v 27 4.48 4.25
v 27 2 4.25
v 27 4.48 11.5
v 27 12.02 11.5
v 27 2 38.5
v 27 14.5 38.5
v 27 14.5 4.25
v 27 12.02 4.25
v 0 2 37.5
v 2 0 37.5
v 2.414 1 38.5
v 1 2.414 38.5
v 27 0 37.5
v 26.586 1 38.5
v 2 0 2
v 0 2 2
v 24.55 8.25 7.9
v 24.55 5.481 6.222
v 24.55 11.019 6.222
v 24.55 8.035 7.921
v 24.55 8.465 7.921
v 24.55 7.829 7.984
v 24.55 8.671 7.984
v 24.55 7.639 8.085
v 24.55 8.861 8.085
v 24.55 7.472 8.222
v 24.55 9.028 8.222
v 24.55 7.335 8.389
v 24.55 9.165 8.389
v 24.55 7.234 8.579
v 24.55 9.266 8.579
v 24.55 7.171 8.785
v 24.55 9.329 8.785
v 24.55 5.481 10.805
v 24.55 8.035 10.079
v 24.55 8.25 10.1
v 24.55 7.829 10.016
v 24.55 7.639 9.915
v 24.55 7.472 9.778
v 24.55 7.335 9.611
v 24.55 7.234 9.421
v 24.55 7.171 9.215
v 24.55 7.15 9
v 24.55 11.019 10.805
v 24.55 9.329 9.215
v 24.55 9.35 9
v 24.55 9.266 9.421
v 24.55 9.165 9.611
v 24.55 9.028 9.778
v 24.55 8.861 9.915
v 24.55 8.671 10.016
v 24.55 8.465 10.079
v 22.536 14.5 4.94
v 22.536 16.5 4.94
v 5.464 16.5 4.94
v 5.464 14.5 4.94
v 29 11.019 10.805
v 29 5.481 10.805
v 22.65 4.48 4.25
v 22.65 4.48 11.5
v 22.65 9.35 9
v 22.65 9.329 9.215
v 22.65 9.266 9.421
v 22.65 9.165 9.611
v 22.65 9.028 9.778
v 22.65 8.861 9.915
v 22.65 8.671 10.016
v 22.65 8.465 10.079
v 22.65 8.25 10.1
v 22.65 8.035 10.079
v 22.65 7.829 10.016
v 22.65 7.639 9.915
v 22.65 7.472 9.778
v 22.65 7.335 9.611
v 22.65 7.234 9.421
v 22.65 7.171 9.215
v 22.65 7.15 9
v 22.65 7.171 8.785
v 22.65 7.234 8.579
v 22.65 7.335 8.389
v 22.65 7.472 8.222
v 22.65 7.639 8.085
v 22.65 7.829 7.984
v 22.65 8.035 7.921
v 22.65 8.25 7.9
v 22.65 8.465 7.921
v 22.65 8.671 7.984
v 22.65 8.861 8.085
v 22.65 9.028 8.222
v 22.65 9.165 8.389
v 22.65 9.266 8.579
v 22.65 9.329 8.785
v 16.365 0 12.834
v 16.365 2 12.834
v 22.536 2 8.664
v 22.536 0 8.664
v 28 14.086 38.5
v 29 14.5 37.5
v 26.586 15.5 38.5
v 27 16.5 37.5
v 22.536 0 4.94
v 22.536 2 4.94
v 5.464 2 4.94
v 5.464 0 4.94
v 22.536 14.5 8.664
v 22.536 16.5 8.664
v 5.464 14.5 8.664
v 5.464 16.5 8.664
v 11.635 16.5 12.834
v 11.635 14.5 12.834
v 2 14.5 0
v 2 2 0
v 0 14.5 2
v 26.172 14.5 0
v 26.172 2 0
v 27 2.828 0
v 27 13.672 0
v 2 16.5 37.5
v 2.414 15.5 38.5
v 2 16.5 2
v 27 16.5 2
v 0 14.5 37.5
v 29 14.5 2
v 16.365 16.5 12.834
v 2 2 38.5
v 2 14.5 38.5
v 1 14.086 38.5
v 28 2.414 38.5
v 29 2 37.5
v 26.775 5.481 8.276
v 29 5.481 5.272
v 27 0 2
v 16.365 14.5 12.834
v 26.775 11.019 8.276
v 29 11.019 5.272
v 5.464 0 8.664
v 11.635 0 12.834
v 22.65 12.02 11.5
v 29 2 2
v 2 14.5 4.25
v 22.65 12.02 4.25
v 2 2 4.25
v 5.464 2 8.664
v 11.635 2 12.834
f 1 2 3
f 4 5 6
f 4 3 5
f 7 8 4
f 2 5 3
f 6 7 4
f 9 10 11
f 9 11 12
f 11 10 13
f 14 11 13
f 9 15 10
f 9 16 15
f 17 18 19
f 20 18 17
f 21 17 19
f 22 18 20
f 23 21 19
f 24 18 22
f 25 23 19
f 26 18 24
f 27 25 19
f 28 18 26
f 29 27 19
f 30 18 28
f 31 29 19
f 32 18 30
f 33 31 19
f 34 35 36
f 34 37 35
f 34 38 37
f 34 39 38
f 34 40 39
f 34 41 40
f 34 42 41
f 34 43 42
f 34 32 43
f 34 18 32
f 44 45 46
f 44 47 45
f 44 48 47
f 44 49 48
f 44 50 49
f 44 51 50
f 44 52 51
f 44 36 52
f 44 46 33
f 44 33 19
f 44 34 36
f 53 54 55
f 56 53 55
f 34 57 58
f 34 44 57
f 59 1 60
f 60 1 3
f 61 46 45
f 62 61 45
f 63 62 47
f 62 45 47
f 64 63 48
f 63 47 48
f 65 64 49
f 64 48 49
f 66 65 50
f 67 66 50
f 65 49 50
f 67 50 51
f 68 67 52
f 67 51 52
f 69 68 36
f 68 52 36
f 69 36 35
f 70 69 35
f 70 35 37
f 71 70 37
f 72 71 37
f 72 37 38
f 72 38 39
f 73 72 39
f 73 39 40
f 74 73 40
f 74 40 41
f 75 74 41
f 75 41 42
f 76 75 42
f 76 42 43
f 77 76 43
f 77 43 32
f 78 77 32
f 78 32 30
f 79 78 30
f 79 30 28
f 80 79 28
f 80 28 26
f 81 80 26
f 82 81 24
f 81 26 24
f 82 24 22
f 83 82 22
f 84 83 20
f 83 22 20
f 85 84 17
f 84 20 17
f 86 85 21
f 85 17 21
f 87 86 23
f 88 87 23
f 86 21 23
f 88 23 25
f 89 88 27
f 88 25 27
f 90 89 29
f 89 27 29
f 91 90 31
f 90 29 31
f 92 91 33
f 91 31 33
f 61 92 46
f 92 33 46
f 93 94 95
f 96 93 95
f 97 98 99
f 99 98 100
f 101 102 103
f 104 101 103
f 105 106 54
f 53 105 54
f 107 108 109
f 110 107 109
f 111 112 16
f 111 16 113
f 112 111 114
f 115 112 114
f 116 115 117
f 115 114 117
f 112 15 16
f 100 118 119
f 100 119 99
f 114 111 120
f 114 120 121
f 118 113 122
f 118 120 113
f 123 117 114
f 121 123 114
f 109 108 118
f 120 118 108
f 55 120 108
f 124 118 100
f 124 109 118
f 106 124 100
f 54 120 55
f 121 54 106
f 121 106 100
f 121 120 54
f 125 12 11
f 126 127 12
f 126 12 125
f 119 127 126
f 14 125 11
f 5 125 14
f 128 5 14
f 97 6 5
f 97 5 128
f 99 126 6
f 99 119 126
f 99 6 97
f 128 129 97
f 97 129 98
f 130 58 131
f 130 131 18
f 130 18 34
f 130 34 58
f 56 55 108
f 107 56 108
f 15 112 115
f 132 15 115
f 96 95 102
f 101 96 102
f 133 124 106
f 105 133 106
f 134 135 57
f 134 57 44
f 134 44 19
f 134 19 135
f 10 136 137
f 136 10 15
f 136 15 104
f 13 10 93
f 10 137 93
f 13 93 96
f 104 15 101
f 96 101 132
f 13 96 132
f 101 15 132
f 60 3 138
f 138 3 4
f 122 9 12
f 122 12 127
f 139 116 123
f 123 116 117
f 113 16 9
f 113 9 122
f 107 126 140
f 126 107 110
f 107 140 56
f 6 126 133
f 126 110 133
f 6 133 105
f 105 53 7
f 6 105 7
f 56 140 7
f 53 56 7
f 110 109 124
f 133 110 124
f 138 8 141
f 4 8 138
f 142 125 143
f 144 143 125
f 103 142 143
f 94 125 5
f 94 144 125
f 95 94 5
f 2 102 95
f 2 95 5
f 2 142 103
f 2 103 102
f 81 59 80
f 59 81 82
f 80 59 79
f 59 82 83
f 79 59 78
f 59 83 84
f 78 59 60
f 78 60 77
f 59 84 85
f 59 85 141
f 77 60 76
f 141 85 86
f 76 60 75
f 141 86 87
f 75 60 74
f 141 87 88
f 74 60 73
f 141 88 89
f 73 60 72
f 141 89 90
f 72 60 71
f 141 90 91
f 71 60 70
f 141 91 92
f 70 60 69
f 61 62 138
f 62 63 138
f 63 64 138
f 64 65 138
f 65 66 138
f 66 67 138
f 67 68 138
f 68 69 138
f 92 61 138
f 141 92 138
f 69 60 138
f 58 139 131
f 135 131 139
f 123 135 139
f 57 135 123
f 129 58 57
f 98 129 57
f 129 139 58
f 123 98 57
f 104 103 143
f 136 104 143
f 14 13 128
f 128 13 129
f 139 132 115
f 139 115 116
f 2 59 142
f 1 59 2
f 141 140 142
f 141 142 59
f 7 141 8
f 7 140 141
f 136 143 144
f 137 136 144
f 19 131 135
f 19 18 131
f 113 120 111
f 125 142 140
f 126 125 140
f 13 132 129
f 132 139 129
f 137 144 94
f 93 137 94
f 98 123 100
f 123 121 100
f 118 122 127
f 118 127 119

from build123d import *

# Parameters (mm, degrees)
F0_W      = 29
F0_H      = 16.5
F1_DEPTH  = 38.5
F2_T      = -2
F3_DEPTH  = 2.25
F4_SIZE   = 2
F5_SIZE   = 2
F6_SIZE   = 1
F8_DEPTH  = 16.501
F9_W      = 7.54
F9_H      = 7.25
F9_R      = 1.1
F10_DEPTH = 6.35
F11_W     = 5.538
F11_H     = 5.533
F13_W     = 5.538
F13_H     = 4.583


with BuildPart() as f1:
    # F0 (on Top) → F1 (new body)
    with BuildSketch(Plane.XY):
        with Locations((14.5, 8.25)):
            Rectangle(F0_W, F0_H)
    extrude(amount=F1_DEPTH)

    # F2
    f2_openings = [f1.faces().sort_by_distance(p)[0] for p in [
        (14.5, 8.25, 38.5),
    ]]
    offset(amount=F2_T, openings=f2_openings)

    # F3 (add): a face of the model
    f3_faces = [f1.faces().sort_by_distance(p)[0] for p in [
        (14.5, 8.25, 2),
    ]]
    extrude(f3_faces, amount=F3_DEPTH)

    # F4
    f4_edges = [f1.edges().sort_by_distance(p)[0] for p in [
        (29, 0, 19.25),
        (29, 16.5, 19.25),
    ]]
    chamfer(f4_edges, length=F4_SIZE)

    # F5
    f5_edges = [f1.edges().sort_by_distance(p)[0] for p in [
        (0, 16.5, 19.25),
        (0, 0, 19.25),
        (13.5, 16.5, 0),
        (13.5, 0, 0),
        (28, 1, 0),
        (0, 8.25, 0),
        (29, 8.25, 0),
        (28, 15.5, 0),
    ]]
    chamfer(f5_edges, length=F5_SIZE)

    # F6
    f6_edges = [f1.edges().sort_by_distance(p)[0] for p in [
        (0, 8.25, 38.5),
        (1, 1, 38.5),
        (14.5, 0, 38.5),
        (1, 15.5, 38.5),
        (14.5, 16.5, 38.5),
        (28, 15.5, 38.5),
        (29, 8.25, 38.5),
        (28, 1, 38.5),
    ]]
    chamfer(f6_edges, length=F6_SIZE)

    # F7 (on face) → F8 (cut, through all)
    with BuildSketch(Plane(origin=(0, 16.5, 0), x_dir=(-1, 0, 0), z_dir=(0, 1, 0))):
        Polygon((-22.536, 8.664), (-22.536, 4.94), (-5.464, 4.94), (-5.464, 8.664), (-11.635, 12.834), (-16.365, 12.834), align=None)
    extrude(amount=-F8_DEPTH, mode=Mode.SUBTRACT)

    # F9 (on face) → F10 (join)
    with BuildSketch(Plane.YZ.offset(29)):
        with Locations((8.25, 7.875)):
            Rectangle(F9_W, F9_H)
        with Locations((8.25, 9)):
            Circle(F9_R, mode=Mode.SUBTRACT)
    extrude(amount=-F10_DEPTH)

    # F11 (on face) → F14 section 0
    with BuildSketch(Plane.YZ.offset(29)):
        with Locations((8.25, 8.0385)):
            Rectangle(F11_W, F11_H)
    # F13 (on offset) → F14 section 1
    with BuildSketch(Plane.YZ.offset(24.55)):
        with Locations((8.25, 8.5135)):
            Rectangle(F13_W, F13_H)
    loft(mode=Mode.SUBTRACT)


solid = f1.part
